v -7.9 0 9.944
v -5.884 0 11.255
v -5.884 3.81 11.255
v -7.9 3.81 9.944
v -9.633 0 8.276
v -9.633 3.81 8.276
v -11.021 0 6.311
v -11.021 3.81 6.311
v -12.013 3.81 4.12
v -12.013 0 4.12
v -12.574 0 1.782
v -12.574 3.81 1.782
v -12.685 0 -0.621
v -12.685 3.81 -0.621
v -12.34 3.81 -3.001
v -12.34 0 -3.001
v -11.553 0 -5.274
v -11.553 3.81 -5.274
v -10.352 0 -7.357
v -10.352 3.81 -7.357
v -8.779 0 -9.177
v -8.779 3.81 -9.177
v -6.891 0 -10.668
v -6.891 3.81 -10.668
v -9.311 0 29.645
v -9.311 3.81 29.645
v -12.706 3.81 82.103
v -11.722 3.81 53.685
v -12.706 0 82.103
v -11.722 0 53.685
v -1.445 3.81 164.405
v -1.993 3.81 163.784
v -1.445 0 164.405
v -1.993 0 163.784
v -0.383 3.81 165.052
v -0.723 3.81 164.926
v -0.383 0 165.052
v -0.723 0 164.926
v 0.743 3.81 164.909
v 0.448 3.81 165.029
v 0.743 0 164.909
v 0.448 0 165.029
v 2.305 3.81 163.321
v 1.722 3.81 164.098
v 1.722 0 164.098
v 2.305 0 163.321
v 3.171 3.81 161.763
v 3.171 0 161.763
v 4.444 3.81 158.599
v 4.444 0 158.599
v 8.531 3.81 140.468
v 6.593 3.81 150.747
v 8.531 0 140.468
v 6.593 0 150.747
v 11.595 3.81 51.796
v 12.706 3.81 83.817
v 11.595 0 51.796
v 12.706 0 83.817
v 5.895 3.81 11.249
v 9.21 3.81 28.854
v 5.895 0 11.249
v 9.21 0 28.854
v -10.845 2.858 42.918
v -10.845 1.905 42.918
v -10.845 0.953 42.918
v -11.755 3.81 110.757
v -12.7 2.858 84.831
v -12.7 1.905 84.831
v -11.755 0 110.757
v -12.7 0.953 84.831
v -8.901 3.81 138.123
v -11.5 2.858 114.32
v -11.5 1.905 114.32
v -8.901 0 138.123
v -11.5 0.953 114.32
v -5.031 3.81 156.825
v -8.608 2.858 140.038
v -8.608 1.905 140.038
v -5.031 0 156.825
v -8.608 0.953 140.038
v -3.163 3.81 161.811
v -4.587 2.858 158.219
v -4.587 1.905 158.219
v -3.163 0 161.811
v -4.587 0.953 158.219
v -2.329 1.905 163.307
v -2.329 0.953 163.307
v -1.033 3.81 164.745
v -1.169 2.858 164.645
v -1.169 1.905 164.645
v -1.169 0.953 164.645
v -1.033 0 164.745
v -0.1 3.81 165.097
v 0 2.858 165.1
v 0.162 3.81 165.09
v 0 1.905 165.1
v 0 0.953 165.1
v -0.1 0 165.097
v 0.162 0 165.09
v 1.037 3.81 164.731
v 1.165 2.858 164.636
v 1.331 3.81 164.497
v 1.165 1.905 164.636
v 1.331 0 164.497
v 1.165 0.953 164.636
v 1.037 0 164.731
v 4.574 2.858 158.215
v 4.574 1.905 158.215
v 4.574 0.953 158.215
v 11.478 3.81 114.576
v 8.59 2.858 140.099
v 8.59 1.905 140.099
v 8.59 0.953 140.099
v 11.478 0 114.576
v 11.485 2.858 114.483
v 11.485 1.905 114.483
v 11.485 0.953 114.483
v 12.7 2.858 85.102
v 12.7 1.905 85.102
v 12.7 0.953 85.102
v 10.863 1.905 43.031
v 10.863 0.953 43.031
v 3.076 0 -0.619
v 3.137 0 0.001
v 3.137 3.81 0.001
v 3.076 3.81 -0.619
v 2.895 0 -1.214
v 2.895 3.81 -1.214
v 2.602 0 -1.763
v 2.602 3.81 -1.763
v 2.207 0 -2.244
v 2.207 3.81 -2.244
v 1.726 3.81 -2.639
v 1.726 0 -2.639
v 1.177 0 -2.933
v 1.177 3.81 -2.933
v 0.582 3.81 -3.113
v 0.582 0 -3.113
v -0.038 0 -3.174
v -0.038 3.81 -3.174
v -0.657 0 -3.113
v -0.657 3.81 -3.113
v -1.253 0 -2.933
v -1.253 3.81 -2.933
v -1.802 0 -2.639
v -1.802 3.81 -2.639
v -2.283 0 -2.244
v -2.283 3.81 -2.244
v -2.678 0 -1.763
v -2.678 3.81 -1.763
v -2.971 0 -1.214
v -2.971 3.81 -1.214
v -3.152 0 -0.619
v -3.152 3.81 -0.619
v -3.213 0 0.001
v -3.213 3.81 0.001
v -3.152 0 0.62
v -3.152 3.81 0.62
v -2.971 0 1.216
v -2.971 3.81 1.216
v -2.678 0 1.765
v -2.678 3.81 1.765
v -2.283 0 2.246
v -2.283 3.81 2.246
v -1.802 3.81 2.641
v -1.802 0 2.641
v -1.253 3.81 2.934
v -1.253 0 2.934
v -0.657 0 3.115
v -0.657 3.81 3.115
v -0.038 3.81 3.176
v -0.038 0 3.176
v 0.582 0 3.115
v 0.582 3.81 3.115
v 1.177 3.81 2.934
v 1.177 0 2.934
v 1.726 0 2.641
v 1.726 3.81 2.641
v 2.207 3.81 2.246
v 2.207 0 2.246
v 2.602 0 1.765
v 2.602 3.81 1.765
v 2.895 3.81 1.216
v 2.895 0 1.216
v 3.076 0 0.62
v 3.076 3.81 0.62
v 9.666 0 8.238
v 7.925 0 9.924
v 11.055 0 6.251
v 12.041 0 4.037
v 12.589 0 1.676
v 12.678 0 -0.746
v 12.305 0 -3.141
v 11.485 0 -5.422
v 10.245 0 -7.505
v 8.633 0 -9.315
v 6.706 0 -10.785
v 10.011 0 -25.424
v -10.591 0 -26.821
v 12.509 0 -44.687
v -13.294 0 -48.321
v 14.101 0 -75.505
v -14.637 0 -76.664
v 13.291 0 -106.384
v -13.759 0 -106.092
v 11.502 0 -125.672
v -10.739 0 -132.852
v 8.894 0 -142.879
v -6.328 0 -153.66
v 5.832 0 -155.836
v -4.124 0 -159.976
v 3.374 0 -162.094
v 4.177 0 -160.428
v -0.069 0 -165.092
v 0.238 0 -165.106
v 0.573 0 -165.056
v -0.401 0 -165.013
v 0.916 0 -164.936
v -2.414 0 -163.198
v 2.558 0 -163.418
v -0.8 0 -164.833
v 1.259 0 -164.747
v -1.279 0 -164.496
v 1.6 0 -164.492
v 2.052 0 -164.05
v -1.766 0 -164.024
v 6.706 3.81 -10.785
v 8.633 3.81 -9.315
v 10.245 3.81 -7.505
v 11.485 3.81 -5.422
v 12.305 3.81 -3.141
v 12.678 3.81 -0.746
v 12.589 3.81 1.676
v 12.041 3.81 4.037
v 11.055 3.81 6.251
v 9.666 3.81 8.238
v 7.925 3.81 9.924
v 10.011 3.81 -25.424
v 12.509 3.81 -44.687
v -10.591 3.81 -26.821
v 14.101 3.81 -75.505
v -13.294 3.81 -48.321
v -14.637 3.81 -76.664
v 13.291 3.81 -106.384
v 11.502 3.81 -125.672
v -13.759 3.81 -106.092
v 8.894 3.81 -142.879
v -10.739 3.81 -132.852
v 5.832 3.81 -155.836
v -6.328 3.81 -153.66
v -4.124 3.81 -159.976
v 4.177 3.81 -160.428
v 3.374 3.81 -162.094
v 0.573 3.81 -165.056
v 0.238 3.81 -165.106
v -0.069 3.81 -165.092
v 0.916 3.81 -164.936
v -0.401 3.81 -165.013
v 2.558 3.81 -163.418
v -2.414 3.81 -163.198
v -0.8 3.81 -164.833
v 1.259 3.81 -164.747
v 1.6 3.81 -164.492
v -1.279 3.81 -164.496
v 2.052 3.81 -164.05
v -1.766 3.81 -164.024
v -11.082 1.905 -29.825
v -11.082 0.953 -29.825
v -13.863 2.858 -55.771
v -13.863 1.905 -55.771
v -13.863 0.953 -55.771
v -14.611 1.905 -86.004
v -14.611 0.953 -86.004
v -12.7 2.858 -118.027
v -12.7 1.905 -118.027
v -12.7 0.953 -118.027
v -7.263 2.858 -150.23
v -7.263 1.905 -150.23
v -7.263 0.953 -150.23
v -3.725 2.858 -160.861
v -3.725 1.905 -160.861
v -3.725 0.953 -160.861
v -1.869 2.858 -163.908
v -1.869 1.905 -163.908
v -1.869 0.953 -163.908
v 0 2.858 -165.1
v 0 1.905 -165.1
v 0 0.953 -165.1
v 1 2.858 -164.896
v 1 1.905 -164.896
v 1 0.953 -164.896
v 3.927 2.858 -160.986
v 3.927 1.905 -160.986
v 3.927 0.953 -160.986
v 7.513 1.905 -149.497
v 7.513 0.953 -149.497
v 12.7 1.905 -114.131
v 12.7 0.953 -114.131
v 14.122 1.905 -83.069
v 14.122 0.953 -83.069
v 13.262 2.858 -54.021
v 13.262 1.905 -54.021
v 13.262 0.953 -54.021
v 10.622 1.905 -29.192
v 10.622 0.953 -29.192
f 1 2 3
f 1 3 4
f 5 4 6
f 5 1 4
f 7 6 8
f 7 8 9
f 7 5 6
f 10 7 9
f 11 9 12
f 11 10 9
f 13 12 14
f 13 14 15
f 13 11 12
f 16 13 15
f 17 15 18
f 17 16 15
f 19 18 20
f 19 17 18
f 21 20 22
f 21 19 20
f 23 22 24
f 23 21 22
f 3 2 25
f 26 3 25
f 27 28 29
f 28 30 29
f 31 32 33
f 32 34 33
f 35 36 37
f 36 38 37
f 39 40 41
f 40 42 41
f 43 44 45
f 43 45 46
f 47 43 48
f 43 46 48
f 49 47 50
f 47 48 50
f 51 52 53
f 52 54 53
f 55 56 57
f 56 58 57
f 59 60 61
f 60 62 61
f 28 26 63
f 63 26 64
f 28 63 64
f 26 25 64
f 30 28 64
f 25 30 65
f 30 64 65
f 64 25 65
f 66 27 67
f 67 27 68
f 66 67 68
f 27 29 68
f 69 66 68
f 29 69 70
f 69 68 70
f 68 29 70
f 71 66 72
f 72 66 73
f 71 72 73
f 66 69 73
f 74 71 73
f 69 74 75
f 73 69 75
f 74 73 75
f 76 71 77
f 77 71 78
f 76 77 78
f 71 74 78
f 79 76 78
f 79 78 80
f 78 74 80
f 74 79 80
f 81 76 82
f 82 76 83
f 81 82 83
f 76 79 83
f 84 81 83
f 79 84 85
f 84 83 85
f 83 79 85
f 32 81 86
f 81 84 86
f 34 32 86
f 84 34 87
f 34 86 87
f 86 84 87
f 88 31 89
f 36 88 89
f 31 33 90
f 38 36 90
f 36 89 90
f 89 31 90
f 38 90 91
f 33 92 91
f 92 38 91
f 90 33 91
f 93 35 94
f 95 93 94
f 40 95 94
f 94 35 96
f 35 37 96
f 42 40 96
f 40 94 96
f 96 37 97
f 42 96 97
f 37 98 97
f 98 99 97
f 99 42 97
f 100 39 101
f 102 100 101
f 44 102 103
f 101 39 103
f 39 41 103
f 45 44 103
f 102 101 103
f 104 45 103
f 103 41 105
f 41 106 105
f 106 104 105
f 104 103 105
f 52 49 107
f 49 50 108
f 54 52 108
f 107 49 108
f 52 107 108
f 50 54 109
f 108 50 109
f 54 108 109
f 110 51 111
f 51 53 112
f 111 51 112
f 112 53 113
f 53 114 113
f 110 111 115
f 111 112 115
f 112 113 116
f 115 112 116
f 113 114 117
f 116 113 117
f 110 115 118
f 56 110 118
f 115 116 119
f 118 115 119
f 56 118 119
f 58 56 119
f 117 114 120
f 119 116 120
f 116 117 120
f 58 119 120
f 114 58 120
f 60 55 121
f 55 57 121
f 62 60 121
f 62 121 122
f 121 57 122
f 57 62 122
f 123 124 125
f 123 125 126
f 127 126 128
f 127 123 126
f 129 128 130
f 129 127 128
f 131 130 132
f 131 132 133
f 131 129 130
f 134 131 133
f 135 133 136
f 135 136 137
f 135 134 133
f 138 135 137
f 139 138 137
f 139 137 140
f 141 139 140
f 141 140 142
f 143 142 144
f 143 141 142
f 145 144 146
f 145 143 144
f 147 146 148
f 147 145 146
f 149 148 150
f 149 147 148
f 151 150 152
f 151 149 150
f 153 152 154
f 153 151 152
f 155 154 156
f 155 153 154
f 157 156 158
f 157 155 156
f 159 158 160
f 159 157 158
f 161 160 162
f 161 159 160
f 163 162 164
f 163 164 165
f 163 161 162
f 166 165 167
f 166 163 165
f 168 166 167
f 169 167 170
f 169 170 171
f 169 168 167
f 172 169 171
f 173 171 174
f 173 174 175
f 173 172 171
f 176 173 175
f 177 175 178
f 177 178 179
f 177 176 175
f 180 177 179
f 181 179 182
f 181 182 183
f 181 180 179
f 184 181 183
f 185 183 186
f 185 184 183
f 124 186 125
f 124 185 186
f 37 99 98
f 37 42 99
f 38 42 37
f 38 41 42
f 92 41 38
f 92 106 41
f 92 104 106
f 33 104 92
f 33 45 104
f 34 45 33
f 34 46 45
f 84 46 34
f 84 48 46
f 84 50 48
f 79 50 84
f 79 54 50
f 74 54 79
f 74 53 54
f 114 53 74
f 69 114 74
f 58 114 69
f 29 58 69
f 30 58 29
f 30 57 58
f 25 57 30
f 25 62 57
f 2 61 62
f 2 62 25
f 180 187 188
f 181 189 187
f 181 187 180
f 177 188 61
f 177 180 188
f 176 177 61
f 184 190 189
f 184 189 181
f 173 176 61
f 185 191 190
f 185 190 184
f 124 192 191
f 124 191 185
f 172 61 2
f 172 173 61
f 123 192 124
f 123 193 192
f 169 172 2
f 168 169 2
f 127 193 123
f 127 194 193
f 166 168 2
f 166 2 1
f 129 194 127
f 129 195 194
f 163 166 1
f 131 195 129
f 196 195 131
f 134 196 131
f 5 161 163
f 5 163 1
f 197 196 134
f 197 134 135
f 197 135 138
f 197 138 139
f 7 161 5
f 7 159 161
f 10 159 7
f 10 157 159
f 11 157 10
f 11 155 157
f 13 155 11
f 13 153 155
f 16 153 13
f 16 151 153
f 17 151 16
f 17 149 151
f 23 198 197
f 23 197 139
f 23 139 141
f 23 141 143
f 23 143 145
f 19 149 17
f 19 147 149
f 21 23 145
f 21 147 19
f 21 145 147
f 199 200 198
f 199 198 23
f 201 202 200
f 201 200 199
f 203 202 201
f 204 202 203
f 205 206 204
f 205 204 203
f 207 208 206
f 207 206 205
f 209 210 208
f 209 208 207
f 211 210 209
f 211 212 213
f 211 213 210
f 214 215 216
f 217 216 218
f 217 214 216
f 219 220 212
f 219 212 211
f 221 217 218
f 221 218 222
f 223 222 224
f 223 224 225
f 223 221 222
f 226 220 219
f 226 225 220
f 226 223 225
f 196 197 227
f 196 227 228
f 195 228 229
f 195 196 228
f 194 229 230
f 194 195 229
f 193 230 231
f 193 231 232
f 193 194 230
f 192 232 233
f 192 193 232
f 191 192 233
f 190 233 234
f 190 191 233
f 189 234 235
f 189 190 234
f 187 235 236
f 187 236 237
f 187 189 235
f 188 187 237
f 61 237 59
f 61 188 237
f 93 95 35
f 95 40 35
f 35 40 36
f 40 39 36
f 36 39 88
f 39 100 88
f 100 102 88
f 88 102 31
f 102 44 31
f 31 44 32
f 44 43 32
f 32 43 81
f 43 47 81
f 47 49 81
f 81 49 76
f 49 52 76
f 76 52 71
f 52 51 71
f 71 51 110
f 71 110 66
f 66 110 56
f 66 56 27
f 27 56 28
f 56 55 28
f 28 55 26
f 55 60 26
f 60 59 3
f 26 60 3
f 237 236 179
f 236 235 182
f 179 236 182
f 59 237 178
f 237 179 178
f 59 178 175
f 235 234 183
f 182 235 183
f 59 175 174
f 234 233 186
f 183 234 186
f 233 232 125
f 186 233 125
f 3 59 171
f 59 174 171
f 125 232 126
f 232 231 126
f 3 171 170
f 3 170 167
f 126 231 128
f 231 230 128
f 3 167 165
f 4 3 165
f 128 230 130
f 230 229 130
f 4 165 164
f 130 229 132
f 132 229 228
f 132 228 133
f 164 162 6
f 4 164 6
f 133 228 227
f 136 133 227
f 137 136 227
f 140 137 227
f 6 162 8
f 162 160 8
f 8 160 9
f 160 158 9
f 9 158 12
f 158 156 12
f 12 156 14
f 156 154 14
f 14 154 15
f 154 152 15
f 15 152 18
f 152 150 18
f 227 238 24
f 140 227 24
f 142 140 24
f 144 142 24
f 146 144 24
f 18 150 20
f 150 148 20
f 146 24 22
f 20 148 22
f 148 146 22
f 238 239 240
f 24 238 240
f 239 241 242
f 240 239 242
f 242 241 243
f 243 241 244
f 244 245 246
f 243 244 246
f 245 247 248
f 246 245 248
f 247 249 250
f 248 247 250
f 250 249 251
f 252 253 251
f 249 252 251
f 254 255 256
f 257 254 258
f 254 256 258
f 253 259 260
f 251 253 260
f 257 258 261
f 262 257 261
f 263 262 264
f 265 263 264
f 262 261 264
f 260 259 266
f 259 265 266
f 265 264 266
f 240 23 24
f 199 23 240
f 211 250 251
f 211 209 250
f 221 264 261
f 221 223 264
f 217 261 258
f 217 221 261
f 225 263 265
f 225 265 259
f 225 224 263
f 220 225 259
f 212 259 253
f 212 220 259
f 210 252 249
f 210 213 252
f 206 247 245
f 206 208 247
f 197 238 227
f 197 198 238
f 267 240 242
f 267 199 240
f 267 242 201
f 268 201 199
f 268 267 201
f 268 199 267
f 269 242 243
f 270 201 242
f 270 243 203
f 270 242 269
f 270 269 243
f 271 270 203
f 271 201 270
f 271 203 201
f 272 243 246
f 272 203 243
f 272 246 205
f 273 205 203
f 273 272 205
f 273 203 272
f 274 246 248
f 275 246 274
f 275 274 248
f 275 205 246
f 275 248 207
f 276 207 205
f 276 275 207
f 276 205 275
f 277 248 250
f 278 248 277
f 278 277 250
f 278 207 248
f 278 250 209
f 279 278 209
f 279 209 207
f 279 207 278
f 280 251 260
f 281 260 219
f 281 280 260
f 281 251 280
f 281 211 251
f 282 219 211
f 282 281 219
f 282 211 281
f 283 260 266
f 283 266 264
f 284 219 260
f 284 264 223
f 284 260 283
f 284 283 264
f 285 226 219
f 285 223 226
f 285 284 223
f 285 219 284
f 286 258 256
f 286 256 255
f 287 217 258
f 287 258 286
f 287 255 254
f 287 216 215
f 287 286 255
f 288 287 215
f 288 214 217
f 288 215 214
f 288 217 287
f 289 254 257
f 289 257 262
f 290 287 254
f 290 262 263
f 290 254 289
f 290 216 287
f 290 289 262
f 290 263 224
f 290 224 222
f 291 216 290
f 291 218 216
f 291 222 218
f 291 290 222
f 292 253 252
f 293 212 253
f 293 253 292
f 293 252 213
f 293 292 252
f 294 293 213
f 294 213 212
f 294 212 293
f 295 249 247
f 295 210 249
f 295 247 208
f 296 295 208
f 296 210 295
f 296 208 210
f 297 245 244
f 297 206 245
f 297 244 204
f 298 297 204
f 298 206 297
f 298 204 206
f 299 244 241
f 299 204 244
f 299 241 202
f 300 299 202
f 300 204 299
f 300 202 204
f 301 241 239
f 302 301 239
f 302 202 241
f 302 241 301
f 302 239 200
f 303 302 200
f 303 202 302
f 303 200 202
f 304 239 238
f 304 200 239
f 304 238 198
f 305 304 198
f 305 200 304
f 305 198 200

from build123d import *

# Parameters (mm, degrees)
SKETCH1_R           = 3.175
BOSS_EXTRUDE1_DEPTH = 3.81


with BuildPart() as part:
    # Sketch1 → Boss-Extrude1 (new body)
    with BuildSketch(Plane(origin=(0, 0, 0), x_dir=(1, 0, 0), z_dir=(0, 1, 0))):
        with BuildLine():
            add(Edge.make_bspline(
                [(-6.891438373, 10.667618157), (-13.141739885, 30.574831134), (-19.587668331, 99.881131685), (0.626884387, 189.415109593), (18.684158102, 98.500490429), (12.553876864, 30.066409487), (6.706113203, 10.785084409)],
                knots=[0.090442646, 0.090442646, 0.090442646, 0.090442646, 0.354535083, 0.500151659, 0.657030324, 0.910712035, 0.910712035, 0.910712035, 0.910712035], degree=3))
            ThreePointArc((6.706113203, 10.785084409), (12.691411814, -0.466975555), (5.895386784, -11.248751694))
            add(Edge.make_bspline(
                [(-5.88391039, -11.254758928), (-9.866416239, -26.666488161), (-16.994481981, -95.929253478), (-0.026632418, -205.140276042), (16.989967462, -96.014162194), (9.887816855, -26.705317248), (5.895386784, -11.248751694)],
                knots=[0.080128559, 0.080128559, 0.080128559, 0.080128559, 0.256247262, 0.4994985, 0.741948497, 0.918677056, 0.918677056, 0.918677056, 0.918677056], degree=3))
            ThreePointArc((-5.88391039, -11.254758928), (-12.68660862, -0.583062373), (-6.891438373, 10.667618157))
        make_face()
        with Locations((-0.037840034, -0.000665164)):
            Circle(SKETCH1_R, mode=Mode.SUBTRACT)
    extrude(amount=BOSS_EXTRUDE1_DEPTH)


solid = part.part
